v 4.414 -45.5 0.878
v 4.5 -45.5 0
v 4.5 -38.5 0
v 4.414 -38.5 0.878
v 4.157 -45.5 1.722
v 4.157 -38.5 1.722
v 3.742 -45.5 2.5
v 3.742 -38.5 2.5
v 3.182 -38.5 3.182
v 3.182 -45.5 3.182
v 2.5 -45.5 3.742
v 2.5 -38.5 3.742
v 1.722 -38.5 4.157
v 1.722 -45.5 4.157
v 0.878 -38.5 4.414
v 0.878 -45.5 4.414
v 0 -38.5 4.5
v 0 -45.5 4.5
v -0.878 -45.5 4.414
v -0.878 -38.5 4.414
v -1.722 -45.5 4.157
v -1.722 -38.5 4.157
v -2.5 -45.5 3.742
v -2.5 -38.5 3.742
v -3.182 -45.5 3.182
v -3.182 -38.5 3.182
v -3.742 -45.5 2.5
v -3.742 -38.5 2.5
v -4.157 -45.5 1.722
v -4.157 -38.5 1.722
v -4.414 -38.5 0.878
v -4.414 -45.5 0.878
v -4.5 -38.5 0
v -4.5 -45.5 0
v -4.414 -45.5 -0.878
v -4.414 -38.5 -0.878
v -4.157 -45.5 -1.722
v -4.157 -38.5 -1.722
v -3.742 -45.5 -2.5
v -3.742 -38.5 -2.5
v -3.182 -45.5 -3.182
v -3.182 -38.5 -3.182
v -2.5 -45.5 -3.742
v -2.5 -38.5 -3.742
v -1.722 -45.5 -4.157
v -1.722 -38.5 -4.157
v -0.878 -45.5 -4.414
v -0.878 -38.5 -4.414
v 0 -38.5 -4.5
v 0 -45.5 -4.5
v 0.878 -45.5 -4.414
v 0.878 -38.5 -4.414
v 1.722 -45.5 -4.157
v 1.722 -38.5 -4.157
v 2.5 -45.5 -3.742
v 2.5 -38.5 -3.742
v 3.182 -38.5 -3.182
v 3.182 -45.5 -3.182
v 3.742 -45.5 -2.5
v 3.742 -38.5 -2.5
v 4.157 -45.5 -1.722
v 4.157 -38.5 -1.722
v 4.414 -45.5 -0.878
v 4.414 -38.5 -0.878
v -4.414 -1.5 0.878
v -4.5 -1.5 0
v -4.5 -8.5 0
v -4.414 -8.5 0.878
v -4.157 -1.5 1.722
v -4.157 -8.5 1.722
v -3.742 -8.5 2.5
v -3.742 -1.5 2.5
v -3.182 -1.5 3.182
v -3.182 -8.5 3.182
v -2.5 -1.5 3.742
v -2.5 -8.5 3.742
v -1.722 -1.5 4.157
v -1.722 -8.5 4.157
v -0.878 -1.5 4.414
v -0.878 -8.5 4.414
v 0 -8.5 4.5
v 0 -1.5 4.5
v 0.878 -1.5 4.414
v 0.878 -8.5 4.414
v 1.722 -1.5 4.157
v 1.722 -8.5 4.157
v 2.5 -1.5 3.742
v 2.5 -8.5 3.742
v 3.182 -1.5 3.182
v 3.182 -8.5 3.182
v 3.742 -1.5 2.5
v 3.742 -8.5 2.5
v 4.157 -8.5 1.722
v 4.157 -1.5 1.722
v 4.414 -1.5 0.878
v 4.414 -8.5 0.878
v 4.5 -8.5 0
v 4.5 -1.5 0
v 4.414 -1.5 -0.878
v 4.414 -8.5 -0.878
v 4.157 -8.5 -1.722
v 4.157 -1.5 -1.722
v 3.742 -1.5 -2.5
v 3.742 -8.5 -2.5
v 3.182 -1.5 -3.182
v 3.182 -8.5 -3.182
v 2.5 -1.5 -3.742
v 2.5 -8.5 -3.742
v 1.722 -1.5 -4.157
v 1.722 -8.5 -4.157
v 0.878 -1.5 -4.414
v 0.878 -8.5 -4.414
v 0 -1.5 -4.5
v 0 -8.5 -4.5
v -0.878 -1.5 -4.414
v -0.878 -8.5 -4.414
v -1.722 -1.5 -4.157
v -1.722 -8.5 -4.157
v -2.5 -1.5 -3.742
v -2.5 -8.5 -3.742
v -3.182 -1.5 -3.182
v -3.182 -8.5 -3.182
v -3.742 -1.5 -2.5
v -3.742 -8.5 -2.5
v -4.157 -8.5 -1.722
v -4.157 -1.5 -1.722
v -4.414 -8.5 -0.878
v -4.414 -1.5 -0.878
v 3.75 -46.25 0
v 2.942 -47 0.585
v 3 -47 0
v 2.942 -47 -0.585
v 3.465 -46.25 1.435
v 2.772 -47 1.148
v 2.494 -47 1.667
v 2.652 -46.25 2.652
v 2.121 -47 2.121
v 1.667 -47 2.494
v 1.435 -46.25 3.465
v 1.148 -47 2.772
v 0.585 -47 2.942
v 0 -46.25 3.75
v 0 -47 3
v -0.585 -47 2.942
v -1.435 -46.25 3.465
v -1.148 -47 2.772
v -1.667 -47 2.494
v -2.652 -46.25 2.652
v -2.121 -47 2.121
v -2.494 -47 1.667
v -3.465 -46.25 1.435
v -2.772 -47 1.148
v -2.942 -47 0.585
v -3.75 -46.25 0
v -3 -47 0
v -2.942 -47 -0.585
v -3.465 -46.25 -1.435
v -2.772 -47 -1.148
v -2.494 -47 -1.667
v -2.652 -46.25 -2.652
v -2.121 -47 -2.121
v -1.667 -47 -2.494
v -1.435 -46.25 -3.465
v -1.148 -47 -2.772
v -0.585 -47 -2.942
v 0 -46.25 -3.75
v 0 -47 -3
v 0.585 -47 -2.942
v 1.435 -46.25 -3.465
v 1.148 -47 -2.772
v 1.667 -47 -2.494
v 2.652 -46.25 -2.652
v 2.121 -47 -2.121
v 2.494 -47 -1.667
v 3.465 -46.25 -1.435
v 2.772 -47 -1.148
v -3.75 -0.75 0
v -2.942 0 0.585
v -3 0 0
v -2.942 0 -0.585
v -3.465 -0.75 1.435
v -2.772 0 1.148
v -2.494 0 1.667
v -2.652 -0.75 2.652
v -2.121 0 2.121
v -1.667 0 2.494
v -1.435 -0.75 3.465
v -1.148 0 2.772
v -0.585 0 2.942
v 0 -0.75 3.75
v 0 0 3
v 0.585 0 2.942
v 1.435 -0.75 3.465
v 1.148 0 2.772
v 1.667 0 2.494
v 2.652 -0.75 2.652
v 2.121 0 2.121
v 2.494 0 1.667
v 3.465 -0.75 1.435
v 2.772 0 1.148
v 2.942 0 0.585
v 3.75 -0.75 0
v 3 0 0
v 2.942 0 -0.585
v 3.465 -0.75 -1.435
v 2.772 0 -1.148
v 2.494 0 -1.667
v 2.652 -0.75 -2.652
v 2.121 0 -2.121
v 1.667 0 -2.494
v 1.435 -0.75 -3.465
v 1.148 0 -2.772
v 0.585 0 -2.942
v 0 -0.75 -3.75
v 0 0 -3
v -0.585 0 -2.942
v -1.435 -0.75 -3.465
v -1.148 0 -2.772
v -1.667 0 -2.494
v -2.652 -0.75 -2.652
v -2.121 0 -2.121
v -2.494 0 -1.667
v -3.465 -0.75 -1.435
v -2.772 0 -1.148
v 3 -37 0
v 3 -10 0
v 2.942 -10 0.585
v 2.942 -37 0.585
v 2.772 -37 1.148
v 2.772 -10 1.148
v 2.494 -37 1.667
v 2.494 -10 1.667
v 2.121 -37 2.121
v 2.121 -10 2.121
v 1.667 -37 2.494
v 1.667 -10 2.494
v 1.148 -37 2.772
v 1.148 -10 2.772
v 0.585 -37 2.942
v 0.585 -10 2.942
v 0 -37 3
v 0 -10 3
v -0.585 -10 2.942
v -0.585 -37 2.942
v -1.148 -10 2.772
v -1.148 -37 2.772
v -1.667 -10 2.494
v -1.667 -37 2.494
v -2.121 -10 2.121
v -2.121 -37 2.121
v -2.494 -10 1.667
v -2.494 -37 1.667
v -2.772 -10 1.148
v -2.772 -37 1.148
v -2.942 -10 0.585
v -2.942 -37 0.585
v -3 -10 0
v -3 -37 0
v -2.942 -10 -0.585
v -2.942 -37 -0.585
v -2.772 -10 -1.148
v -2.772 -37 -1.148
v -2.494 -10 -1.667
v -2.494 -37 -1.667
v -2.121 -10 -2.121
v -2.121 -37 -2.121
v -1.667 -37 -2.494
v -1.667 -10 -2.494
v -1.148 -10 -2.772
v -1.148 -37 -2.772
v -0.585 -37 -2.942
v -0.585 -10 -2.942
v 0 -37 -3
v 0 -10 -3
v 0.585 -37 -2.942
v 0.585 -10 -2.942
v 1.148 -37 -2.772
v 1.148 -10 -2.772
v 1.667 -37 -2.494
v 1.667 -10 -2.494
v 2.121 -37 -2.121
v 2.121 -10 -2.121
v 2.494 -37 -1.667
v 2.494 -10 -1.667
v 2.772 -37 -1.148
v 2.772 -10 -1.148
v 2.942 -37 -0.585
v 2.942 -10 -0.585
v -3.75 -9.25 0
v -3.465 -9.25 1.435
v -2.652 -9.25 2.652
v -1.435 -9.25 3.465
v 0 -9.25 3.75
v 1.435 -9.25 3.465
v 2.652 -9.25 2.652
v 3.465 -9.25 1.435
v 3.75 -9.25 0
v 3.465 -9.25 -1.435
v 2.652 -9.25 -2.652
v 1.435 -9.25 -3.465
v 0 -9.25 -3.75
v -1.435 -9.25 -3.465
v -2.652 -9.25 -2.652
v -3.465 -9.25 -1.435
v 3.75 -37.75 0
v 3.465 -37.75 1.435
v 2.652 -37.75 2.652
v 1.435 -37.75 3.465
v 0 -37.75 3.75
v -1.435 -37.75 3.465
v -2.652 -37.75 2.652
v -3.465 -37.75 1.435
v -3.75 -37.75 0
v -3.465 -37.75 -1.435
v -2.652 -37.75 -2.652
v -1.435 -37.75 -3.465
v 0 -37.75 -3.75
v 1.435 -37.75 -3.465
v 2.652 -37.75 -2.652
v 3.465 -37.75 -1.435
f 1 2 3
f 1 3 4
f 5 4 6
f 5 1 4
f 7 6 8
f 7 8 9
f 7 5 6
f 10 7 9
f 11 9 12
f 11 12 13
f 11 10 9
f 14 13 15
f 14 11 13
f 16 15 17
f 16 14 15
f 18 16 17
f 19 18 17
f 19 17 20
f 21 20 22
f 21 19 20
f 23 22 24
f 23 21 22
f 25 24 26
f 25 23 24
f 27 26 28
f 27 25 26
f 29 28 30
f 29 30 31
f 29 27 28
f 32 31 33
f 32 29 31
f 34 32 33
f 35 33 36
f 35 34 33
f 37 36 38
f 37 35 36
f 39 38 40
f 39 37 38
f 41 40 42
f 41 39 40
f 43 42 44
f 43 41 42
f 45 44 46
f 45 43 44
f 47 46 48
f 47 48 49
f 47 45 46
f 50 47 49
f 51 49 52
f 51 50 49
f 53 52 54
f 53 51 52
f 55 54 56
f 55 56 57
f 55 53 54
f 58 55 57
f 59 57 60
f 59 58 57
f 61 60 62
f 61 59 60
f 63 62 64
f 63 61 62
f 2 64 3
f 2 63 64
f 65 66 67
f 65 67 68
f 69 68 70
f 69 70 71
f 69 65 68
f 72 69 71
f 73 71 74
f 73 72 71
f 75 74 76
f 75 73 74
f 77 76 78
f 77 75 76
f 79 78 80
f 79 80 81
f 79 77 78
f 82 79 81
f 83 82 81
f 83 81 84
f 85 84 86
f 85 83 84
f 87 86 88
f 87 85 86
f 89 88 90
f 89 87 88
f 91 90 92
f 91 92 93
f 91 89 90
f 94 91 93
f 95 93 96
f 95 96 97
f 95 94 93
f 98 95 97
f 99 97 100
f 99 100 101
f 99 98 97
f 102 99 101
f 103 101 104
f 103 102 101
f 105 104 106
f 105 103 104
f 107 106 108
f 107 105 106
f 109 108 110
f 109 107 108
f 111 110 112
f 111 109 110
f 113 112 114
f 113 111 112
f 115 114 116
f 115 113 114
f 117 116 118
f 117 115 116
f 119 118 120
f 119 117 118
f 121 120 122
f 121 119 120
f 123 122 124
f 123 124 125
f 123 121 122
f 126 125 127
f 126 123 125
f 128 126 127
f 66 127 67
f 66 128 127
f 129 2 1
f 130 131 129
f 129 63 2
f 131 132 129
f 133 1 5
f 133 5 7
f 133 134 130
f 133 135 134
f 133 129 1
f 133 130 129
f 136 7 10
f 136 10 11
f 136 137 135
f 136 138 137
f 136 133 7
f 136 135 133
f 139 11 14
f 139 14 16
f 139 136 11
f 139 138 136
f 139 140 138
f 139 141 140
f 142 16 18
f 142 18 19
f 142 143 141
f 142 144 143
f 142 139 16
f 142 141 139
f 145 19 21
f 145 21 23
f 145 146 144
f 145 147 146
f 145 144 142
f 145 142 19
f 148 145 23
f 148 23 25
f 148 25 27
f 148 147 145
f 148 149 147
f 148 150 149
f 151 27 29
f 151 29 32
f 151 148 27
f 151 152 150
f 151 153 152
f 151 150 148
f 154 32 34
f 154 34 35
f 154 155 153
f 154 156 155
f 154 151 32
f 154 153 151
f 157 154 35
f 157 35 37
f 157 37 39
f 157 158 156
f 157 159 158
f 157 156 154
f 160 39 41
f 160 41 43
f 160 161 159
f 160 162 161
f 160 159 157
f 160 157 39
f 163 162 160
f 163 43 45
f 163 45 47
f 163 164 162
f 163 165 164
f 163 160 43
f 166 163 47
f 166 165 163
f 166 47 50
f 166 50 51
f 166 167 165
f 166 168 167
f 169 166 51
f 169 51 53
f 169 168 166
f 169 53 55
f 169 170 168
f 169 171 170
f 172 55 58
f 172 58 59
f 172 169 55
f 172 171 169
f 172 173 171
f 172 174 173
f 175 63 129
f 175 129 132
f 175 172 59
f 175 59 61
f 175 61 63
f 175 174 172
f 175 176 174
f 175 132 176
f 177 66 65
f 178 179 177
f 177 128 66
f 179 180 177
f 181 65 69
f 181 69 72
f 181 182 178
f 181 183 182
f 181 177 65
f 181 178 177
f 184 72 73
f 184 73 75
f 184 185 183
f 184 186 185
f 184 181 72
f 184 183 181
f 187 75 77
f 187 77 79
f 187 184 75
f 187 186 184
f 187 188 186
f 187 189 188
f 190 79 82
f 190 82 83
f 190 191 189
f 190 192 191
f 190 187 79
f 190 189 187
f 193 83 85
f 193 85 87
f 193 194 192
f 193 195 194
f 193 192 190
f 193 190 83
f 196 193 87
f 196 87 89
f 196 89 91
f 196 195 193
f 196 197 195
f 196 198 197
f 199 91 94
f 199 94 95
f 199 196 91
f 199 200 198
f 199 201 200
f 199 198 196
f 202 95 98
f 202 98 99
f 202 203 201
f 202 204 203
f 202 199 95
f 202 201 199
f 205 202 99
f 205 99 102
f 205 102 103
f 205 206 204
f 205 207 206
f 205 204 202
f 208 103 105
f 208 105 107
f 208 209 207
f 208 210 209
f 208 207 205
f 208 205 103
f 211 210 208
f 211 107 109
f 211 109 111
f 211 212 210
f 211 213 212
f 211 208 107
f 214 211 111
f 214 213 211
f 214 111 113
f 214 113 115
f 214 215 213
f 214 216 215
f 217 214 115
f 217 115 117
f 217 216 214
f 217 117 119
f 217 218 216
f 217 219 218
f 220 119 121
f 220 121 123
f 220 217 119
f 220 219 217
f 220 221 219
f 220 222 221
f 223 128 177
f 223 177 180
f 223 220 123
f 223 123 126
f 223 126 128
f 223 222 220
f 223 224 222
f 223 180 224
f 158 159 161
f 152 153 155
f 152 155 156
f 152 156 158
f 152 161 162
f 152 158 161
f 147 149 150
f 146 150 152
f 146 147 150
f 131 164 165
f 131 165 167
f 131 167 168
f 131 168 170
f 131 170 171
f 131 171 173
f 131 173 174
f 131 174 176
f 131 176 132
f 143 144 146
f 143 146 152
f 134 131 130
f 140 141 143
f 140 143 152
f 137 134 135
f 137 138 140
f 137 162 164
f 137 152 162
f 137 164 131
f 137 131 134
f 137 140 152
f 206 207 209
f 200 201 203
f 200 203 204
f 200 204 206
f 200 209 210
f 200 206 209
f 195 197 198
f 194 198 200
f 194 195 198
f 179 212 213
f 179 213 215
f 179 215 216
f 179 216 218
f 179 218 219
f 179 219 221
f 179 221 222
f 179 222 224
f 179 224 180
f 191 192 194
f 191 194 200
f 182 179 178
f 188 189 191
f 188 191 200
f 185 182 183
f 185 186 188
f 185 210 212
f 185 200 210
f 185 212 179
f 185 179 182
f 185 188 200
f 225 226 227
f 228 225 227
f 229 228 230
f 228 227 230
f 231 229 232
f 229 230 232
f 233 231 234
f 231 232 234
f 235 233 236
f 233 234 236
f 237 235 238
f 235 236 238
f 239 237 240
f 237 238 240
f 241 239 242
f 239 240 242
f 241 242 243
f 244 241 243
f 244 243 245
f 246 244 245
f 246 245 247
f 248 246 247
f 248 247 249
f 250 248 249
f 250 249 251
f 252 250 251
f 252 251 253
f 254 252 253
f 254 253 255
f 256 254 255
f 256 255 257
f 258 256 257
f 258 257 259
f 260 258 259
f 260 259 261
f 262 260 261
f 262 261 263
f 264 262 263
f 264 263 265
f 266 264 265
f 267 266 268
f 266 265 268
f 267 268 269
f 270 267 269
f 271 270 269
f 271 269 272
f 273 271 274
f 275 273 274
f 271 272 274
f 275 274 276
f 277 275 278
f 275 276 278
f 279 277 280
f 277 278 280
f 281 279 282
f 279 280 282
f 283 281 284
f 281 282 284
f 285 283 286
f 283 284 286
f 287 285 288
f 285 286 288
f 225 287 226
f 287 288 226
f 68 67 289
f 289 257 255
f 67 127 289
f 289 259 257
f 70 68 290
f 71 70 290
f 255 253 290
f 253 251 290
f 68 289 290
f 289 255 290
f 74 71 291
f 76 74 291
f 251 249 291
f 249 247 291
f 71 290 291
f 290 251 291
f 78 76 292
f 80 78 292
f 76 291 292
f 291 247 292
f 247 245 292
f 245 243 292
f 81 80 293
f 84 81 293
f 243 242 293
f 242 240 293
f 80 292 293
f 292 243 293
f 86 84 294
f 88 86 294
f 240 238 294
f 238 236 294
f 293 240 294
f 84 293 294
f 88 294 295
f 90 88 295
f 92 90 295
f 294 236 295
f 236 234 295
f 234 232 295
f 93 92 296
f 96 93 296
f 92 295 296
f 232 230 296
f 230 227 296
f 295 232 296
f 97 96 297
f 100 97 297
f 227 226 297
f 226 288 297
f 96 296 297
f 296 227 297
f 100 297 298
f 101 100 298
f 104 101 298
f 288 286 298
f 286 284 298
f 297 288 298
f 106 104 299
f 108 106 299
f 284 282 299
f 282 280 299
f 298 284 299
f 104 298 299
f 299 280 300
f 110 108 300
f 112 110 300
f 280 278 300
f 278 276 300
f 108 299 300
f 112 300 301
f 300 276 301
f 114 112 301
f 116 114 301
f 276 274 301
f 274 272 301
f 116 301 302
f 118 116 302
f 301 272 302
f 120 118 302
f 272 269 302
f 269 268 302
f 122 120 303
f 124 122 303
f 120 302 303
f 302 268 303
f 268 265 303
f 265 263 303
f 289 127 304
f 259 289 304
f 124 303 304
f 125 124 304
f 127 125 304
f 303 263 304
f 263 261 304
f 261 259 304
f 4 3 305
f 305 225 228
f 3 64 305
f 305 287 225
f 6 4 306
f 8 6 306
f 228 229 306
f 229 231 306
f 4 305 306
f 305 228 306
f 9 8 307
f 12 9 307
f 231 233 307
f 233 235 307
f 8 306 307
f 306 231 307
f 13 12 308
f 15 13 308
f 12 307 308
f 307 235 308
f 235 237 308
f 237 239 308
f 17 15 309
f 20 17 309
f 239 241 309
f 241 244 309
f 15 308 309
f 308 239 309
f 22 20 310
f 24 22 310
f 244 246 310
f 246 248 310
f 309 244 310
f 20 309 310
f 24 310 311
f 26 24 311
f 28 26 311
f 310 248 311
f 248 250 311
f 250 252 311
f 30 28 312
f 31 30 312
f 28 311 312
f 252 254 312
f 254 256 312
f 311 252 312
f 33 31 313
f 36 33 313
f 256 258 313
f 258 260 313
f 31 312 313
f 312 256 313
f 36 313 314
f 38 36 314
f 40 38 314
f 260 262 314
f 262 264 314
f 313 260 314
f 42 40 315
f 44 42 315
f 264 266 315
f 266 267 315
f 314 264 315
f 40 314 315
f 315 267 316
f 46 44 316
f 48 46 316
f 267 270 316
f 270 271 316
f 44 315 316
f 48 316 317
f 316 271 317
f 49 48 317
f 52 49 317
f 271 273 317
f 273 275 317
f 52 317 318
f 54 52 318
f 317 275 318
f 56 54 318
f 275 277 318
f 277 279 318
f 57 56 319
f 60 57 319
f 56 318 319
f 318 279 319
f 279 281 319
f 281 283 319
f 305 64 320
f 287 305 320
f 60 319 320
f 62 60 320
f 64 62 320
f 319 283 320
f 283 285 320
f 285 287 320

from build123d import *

# Parameters (mm, degrees)
F0_R     = 3
F1_DEPTH = 47
F2_R     = 4.5
F2_R_2   = 3
F3_DEPTH = 10
F4_SIZE  = 1.49999
F5_R     = 4.5
F6_DEPTH = 10
F7_SIZE  = 1.49999


# Not quite as in the source:
# - a fillet or chamfer is up to 0.001 mm smaller than in the source, because OpenCascade refuses the exact size


with BuildPart() as f1:
    # F0 (on Front) → F1 (new body)
    with BuildSketch(Plane.XZ):
        Circle(F0_R)
    extrude(amount=F1_DEPTH)

    # F2 (on face) → F3 (join)
    with BuildSketch(Plane.XZ.offset(47)):
        Circle(F2_R)
        Circle(F2_R_2, mode=Mode.SUBTRACT)
    extrude(amount=-F3_DEPTH)

    # F4 (size 1.5 in the source; OpenCascade refuses exactly that, so slightly less here)
    f4_edges = [f1.edges().sort_by_distance(p)[0] for p in [
        (-4.5, -37, 0),
        (-4.5, -47, 0),
    ]]
    chamfer(f4_edges, length=F4_SIZE)

    # F5 (on face) → F6 (join)
    with BuildSketch(Plane(origin=(0, 0, 0), x_dir=(-1, 0, 0), z_dir=(0, 1, 0))):
        Circle(F5_R)
    extrude(amount=-F6_DEPTH)

    # F7 (size 1.5 in the source; OpenCascade refuses exactly that, so slightly less here)
    f7_edges = [f1.edges().sort_by_distance(p)[0] for p in [
        (4.5, -10, 0),
        (4.5, 0, 0),
    ]]
    chamfer(f7_edges, length=F7_SIZE)


solid = f1.part
